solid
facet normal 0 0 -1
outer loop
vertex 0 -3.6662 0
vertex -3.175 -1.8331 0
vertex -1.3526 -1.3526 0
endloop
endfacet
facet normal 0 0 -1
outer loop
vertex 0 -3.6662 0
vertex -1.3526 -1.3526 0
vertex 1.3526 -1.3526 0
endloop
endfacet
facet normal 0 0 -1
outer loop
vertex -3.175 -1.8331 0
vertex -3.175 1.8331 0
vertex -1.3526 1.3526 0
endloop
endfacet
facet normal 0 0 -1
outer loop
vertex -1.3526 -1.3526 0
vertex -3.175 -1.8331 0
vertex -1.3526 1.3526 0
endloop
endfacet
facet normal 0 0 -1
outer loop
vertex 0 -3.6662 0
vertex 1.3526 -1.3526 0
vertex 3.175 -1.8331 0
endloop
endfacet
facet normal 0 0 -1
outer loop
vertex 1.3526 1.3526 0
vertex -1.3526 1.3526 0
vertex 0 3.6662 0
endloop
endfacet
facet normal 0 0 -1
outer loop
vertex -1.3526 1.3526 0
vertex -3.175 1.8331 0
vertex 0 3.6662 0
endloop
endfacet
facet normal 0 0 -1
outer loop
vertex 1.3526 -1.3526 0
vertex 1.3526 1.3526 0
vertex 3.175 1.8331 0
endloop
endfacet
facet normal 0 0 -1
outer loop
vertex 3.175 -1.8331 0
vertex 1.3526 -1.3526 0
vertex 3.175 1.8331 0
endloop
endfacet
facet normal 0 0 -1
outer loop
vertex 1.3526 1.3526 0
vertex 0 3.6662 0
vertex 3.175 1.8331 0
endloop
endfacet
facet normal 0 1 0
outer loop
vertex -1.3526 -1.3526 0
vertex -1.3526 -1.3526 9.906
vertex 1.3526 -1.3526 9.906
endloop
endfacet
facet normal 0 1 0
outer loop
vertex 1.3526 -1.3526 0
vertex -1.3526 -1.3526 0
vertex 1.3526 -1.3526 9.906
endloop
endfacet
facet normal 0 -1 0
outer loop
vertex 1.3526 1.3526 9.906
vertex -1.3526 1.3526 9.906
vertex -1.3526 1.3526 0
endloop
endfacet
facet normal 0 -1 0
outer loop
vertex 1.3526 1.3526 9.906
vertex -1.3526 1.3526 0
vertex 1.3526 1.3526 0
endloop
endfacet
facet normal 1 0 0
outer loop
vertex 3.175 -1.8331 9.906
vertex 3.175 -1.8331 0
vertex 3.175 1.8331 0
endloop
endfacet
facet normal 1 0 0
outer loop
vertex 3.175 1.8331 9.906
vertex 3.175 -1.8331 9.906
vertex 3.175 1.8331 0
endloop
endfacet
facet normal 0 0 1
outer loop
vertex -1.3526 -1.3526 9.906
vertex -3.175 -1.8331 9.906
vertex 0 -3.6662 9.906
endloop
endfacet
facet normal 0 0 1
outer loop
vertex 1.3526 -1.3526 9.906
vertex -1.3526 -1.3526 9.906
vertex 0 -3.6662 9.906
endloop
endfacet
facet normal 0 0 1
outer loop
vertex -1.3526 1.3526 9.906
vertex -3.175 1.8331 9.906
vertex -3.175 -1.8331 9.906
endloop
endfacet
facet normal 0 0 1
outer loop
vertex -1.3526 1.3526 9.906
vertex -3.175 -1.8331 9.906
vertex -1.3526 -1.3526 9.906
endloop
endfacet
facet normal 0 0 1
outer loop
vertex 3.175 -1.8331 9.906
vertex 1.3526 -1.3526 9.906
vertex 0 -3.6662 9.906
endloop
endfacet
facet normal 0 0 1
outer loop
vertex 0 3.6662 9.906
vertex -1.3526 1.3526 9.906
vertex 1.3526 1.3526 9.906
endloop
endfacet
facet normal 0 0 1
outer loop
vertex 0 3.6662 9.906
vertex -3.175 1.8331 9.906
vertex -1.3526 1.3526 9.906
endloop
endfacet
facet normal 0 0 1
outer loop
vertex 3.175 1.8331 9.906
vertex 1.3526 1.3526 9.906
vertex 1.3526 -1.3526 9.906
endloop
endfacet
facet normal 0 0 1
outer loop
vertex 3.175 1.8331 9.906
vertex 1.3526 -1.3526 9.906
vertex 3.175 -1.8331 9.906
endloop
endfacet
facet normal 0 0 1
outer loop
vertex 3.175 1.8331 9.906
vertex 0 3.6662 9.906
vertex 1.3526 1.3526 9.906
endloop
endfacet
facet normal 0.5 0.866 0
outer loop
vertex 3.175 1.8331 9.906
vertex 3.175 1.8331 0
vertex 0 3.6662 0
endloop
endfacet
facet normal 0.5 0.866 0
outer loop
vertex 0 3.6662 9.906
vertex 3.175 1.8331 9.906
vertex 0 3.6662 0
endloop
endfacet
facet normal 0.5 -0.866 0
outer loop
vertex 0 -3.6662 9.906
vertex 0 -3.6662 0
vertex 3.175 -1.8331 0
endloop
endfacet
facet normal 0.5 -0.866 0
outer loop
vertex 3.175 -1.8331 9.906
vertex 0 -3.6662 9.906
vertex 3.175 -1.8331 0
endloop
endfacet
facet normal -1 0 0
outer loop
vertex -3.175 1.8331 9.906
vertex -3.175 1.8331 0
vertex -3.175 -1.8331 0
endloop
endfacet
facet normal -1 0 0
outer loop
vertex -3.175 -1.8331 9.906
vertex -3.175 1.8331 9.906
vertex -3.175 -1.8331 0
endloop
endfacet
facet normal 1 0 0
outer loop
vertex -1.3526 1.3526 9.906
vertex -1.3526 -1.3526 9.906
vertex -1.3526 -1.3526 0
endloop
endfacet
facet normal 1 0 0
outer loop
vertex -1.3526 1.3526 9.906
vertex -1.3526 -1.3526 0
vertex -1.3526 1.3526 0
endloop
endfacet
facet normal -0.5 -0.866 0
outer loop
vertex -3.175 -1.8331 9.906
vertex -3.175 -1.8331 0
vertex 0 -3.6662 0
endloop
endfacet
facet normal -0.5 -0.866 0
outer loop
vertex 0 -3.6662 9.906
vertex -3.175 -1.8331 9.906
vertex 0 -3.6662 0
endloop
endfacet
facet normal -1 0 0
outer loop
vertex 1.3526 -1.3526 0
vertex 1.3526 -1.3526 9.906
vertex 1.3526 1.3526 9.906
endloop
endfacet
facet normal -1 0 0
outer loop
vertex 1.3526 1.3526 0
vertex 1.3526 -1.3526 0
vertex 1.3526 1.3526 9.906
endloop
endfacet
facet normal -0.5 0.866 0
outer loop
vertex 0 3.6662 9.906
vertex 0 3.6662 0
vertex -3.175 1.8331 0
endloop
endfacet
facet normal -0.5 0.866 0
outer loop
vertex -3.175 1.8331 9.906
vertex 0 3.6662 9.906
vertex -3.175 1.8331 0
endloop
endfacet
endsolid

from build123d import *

# Parameters (mm, degrees)
SKETCH_W  = 2.7051
SKETCH_H  = 2.7051
PAD_DEPTH = 9.906


with BuildPart() as part:
    # Sketch → Pad (new body)
    with BuildSketch(Plane.XY):
        Polygon((0, 3.666174), (-3.175, 1.833087), (-3.175, -1.833087), (0, -3.666174), (3.175, -1.833087), (3.175, 1.833087), align=None)
        Rectangle(SKETCH_W, SKETCH_H, mode=Mode.SUBTRACT)
    extrude(amount=PAD_DEPTH)


solid = part.part
